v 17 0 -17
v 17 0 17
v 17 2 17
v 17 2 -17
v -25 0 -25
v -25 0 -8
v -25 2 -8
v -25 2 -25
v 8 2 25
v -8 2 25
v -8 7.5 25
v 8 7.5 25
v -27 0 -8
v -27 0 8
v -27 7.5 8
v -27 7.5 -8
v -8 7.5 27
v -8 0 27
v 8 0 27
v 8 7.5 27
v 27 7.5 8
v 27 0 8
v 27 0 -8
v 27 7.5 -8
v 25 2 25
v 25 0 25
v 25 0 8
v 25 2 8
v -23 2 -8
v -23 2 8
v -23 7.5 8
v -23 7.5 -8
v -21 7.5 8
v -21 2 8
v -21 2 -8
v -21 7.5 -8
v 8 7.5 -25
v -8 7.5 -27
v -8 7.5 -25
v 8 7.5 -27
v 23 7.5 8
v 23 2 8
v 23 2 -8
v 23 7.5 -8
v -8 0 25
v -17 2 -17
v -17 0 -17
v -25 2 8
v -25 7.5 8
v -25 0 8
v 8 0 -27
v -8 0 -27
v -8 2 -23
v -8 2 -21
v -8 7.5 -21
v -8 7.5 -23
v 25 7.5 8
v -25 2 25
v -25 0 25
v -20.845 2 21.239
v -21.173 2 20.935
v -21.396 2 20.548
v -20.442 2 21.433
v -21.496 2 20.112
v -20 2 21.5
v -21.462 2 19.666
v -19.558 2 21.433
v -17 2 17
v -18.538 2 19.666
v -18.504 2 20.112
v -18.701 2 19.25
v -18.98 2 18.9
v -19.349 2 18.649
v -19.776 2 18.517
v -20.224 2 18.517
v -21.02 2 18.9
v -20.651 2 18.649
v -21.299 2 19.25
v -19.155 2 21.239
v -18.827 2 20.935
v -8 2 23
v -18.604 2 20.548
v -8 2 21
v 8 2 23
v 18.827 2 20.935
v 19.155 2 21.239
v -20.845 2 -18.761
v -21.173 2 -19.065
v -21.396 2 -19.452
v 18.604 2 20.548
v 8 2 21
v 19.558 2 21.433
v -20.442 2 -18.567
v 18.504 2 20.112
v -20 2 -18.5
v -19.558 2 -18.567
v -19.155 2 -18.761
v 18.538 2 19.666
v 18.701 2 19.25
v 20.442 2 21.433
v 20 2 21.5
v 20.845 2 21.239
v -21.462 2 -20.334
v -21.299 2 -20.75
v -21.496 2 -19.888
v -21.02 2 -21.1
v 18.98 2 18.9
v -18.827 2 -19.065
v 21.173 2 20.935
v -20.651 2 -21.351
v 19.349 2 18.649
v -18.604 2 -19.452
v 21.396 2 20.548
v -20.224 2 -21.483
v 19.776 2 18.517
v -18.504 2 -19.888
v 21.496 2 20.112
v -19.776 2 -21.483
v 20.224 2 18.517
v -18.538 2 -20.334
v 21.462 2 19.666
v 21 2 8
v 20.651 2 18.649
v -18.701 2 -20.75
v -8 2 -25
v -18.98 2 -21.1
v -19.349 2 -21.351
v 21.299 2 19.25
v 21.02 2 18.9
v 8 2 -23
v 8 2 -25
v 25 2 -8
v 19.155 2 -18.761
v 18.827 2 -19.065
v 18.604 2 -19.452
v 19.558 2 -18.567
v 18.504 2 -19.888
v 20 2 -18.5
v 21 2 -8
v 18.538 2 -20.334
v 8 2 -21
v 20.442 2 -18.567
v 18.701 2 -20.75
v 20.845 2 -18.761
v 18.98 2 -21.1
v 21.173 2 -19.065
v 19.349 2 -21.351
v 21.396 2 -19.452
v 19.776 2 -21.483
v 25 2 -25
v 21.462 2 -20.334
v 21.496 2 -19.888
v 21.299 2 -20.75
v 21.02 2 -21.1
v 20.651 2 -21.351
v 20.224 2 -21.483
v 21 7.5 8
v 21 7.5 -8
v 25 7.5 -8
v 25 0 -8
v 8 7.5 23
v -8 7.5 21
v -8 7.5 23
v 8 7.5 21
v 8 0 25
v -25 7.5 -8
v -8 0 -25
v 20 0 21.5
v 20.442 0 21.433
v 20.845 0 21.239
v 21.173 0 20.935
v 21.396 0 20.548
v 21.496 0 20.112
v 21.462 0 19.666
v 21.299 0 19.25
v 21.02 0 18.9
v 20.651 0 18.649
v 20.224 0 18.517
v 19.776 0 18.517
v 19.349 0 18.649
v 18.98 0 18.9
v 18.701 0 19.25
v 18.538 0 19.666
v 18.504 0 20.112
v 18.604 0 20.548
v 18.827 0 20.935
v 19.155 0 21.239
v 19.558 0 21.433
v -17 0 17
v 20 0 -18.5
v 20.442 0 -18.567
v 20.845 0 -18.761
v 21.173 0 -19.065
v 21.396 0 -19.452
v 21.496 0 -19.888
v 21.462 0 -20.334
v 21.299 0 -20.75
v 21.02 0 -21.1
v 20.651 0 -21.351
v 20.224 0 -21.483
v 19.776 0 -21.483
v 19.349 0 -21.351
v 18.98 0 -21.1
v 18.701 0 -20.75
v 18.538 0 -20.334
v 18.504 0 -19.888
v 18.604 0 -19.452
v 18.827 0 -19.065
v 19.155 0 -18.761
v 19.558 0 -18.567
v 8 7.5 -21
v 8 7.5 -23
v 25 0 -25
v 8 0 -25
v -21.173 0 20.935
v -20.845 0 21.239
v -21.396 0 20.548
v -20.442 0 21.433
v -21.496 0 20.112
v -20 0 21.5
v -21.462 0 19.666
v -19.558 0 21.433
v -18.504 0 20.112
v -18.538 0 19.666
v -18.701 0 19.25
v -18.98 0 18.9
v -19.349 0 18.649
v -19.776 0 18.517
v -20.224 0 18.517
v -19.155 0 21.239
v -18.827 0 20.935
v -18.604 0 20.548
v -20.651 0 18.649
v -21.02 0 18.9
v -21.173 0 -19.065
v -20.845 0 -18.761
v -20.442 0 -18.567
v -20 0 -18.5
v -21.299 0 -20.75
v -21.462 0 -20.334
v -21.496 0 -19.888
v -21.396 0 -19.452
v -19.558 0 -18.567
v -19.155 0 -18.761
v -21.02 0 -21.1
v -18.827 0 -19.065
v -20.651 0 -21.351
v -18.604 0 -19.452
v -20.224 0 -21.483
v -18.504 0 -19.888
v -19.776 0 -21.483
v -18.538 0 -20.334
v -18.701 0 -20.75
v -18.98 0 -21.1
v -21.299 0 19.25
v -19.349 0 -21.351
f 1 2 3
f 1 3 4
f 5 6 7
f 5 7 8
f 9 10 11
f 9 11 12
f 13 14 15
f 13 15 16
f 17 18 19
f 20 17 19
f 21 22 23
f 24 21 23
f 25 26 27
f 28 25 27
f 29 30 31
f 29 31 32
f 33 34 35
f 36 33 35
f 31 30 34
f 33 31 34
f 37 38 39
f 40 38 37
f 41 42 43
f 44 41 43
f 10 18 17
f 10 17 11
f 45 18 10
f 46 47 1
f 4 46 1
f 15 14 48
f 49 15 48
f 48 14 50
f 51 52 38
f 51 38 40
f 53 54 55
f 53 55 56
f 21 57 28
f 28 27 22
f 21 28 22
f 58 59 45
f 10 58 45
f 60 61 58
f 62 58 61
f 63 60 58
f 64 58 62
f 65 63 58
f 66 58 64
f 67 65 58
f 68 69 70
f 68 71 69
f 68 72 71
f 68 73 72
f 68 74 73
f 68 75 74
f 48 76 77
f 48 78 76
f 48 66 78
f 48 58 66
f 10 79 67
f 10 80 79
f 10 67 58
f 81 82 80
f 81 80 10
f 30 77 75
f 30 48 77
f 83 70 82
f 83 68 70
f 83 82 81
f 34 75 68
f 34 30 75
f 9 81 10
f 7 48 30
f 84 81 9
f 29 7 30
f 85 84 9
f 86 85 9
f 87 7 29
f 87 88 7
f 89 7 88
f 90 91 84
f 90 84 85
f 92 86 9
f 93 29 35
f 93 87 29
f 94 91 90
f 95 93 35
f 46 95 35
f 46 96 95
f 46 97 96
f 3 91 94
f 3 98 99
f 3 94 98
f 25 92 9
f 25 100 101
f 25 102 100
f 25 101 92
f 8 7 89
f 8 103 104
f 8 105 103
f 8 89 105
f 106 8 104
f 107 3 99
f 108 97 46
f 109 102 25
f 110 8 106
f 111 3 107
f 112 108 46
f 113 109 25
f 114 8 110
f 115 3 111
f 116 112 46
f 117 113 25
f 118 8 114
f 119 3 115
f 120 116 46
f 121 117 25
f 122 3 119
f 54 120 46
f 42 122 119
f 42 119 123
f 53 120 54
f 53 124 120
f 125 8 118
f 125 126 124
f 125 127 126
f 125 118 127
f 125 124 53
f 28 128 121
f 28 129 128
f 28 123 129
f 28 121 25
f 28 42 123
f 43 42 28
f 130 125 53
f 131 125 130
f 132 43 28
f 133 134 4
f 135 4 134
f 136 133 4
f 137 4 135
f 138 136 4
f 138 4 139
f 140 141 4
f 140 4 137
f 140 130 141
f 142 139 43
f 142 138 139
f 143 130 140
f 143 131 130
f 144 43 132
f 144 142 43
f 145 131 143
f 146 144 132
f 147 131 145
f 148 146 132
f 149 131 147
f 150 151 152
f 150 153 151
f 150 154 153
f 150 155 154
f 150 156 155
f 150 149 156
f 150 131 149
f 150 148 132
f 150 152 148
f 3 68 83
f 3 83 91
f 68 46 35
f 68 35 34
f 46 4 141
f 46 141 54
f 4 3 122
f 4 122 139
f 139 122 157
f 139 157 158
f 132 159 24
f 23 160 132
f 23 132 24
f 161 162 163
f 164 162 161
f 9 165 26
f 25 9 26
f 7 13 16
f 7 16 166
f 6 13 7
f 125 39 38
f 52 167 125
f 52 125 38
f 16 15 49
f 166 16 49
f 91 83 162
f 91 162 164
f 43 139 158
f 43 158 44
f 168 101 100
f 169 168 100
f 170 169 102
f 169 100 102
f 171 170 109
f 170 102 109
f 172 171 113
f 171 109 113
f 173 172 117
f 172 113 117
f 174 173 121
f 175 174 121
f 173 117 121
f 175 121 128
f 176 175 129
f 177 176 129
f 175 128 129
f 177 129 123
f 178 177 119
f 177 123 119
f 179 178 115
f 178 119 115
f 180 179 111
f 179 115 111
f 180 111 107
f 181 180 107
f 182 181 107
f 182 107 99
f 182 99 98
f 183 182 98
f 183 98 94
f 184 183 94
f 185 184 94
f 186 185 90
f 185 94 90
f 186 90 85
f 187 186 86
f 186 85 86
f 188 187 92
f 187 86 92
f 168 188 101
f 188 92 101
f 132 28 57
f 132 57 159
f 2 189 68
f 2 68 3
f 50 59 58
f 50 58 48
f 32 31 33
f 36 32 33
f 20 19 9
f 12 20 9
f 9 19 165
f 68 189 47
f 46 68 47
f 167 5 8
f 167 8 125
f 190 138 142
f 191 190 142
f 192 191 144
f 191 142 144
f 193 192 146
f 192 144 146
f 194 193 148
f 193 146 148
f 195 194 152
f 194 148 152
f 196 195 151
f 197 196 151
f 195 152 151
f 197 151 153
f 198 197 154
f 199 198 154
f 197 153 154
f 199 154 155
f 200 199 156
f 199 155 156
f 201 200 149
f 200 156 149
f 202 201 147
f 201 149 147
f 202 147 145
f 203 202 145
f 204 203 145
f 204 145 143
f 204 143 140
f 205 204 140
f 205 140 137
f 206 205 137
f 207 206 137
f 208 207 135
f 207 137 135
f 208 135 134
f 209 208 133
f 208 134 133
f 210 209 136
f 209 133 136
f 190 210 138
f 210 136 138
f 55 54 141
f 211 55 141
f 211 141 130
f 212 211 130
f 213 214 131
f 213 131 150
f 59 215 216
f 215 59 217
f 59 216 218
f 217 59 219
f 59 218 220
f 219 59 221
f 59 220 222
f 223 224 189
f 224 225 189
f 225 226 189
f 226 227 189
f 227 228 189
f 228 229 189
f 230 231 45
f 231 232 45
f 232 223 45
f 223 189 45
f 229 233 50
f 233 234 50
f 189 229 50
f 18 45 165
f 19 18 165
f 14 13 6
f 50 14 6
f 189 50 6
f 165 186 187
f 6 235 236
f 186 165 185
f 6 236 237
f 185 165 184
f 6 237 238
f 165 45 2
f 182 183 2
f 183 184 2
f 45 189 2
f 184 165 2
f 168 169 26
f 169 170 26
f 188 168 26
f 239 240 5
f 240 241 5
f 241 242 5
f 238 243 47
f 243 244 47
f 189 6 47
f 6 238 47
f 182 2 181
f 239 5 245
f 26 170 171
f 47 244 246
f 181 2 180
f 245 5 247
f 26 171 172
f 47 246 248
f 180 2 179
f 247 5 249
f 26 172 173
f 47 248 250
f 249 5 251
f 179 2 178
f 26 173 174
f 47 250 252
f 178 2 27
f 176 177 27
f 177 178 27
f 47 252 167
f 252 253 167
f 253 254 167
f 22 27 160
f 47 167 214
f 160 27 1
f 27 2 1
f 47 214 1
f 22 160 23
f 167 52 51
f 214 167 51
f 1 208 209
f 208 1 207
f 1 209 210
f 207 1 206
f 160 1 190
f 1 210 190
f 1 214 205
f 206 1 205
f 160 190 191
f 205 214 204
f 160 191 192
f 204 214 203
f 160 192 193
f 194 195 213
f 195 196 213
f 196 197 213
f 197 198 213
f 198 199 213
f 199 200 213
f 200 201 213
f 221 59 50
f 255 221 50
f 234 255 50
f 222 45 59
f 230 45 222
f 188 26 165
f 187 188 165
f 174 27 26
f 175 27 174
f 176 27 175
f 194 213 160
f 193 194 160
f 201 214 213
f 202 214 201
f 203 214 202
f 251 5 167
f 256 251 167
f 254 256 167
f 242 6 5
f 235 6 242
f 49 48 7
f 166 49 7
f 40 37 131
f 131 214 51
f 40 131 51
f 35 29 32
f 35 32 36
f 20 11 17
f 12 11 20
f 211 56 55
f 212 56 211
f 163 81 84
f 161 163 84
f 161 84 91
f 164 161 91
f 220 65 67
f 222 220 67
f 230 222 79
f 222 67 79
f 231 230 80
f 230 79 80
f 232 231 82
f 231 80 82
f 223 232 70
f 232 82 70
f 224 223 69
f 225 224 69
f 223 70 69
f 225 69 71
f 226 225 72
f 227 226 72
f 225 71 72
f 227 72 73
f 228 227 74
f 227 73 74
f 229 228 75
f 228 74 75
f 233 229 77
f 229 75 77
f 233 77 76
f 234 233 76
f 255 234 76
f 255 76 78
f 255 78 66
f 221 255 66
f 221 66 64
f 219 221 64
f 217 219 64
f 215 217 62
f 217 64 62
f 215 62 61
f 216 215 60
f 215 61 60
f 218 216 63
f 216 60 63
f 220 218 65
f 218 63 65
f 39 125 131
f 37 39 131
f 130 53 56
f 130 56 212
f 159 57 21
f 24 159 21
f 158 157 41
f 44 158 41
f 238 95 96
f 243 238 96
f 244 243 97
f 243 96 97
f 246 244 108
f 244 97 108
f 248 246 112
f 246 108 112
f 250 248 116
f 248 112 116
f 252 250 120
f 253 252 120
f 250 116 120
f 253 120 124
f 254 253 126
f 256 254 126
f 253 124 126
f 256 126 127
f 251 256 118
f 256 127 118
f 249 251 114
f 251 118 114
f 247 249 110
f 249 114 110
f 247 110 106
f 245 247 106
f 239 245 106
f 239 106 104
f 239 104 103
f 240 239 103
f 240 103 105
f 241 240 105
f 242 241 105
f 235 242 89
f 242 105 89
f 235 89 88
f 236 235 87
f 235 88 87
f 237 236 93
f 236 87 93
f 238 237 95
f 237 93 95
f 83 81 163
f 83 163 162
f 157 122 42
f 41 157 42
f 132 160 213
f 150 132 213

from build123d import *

# Parameters (mm, degrees)
SKETCH1_W           = 50
SKETCH1_H           = 50
SKETCH1_W_2         = 34
SKETCH1_H_2         = 34
BOSS_EXTRUDE1_DEPTH = 2
SKETCH2_R           = 1.5
CUT_EXTRUDE1_DEPTH  = 2
SKETCH7_W           = 16
SKETCH7_H           = 2
SKETCH7_W_2         = 2
SKETCH7_H_2         = 16
BOSS_EXTRUDE4_DEPTH = 7.5


with BuildPart() as part:
    # Sketch1 → Boss-Extrude1 (new body)
    with BuildSketch(Plane(origin=(0, 0, 0), x_dir=(1, 0, 0), z_dir=(0, 1, 0))):
        Rectangle(SKETCH1_W, SKETCH1_H)
        Rectangle(SKETCH1_W_2, SKETCH1_H_2, mode=Mode.SUBTRACT)
    extrude(amount=BOSS_EXTRUDE1_DEPTH)

    # Sketch2 → Cut-Extrude1 (cut)
    with BuildSketch(Plane(origin=(0, 2, 0), x_dir=(1, 0, 0), z_dir=(0, 1, 0))):
        with Locations(Location((-20, 20, 0), (0, 0, 270))):
            Circle(SKETCH2_R)
        with Locations(Location((20, 20, 0), (0, 0, 270))):
            Circle(SKETCH2_R)
        with Locations(Location((20, -20, 0), (0, 0, 270))):
            Circle(SKETCH2_R)
        with Locations(Location((-20, -20, 0), (0, 0, 270))):
            Circle(SKETCH2_R)
    extrude(amount=-CUT_EXTRUDE1_DEPTH, mode=Mode.SUBTRACT)

    # Sketch7 → Boss-Extrude4 (add)
    with BuildSketch(Plane(origin=(0, 0, 0), x_dir=(1, 0, 0), z_dir=(0, 1, 0))):
        with Locations((0, 22)):
            Rectangle(SKETCH7_W, SKETCH7_H)
        with Locations((-26, 0)):
            Rectangle(SKETCH7_W_2, SKETCH7_H_2)
        with Locations((-22, 0)):
            Rectangle(SKETCH7_W_2, SKETCH7_H_2)
        with Locations((0, 26)):
            Rectangle(SKETCH7_W, SKETCH7_H)
        with Locations((22, 0)):
            Rectangle(SKETCH7_W_2, SKETCH7_H_2)
        with Locations((26, 0)):
            Rectangle(SKETCH7_W_2, SKETCH7_H_2)
        with Locations((0, -22)):
            Rectangle(SKETCH7_W, SKETCH7_H)
        with Locations((0, -26)):
            Rectangle(SKETCH7_W, SKETCH7_H)
    extrude(amount=BOSS_EXTRUDE4_DEPTH)


solid = part.part
